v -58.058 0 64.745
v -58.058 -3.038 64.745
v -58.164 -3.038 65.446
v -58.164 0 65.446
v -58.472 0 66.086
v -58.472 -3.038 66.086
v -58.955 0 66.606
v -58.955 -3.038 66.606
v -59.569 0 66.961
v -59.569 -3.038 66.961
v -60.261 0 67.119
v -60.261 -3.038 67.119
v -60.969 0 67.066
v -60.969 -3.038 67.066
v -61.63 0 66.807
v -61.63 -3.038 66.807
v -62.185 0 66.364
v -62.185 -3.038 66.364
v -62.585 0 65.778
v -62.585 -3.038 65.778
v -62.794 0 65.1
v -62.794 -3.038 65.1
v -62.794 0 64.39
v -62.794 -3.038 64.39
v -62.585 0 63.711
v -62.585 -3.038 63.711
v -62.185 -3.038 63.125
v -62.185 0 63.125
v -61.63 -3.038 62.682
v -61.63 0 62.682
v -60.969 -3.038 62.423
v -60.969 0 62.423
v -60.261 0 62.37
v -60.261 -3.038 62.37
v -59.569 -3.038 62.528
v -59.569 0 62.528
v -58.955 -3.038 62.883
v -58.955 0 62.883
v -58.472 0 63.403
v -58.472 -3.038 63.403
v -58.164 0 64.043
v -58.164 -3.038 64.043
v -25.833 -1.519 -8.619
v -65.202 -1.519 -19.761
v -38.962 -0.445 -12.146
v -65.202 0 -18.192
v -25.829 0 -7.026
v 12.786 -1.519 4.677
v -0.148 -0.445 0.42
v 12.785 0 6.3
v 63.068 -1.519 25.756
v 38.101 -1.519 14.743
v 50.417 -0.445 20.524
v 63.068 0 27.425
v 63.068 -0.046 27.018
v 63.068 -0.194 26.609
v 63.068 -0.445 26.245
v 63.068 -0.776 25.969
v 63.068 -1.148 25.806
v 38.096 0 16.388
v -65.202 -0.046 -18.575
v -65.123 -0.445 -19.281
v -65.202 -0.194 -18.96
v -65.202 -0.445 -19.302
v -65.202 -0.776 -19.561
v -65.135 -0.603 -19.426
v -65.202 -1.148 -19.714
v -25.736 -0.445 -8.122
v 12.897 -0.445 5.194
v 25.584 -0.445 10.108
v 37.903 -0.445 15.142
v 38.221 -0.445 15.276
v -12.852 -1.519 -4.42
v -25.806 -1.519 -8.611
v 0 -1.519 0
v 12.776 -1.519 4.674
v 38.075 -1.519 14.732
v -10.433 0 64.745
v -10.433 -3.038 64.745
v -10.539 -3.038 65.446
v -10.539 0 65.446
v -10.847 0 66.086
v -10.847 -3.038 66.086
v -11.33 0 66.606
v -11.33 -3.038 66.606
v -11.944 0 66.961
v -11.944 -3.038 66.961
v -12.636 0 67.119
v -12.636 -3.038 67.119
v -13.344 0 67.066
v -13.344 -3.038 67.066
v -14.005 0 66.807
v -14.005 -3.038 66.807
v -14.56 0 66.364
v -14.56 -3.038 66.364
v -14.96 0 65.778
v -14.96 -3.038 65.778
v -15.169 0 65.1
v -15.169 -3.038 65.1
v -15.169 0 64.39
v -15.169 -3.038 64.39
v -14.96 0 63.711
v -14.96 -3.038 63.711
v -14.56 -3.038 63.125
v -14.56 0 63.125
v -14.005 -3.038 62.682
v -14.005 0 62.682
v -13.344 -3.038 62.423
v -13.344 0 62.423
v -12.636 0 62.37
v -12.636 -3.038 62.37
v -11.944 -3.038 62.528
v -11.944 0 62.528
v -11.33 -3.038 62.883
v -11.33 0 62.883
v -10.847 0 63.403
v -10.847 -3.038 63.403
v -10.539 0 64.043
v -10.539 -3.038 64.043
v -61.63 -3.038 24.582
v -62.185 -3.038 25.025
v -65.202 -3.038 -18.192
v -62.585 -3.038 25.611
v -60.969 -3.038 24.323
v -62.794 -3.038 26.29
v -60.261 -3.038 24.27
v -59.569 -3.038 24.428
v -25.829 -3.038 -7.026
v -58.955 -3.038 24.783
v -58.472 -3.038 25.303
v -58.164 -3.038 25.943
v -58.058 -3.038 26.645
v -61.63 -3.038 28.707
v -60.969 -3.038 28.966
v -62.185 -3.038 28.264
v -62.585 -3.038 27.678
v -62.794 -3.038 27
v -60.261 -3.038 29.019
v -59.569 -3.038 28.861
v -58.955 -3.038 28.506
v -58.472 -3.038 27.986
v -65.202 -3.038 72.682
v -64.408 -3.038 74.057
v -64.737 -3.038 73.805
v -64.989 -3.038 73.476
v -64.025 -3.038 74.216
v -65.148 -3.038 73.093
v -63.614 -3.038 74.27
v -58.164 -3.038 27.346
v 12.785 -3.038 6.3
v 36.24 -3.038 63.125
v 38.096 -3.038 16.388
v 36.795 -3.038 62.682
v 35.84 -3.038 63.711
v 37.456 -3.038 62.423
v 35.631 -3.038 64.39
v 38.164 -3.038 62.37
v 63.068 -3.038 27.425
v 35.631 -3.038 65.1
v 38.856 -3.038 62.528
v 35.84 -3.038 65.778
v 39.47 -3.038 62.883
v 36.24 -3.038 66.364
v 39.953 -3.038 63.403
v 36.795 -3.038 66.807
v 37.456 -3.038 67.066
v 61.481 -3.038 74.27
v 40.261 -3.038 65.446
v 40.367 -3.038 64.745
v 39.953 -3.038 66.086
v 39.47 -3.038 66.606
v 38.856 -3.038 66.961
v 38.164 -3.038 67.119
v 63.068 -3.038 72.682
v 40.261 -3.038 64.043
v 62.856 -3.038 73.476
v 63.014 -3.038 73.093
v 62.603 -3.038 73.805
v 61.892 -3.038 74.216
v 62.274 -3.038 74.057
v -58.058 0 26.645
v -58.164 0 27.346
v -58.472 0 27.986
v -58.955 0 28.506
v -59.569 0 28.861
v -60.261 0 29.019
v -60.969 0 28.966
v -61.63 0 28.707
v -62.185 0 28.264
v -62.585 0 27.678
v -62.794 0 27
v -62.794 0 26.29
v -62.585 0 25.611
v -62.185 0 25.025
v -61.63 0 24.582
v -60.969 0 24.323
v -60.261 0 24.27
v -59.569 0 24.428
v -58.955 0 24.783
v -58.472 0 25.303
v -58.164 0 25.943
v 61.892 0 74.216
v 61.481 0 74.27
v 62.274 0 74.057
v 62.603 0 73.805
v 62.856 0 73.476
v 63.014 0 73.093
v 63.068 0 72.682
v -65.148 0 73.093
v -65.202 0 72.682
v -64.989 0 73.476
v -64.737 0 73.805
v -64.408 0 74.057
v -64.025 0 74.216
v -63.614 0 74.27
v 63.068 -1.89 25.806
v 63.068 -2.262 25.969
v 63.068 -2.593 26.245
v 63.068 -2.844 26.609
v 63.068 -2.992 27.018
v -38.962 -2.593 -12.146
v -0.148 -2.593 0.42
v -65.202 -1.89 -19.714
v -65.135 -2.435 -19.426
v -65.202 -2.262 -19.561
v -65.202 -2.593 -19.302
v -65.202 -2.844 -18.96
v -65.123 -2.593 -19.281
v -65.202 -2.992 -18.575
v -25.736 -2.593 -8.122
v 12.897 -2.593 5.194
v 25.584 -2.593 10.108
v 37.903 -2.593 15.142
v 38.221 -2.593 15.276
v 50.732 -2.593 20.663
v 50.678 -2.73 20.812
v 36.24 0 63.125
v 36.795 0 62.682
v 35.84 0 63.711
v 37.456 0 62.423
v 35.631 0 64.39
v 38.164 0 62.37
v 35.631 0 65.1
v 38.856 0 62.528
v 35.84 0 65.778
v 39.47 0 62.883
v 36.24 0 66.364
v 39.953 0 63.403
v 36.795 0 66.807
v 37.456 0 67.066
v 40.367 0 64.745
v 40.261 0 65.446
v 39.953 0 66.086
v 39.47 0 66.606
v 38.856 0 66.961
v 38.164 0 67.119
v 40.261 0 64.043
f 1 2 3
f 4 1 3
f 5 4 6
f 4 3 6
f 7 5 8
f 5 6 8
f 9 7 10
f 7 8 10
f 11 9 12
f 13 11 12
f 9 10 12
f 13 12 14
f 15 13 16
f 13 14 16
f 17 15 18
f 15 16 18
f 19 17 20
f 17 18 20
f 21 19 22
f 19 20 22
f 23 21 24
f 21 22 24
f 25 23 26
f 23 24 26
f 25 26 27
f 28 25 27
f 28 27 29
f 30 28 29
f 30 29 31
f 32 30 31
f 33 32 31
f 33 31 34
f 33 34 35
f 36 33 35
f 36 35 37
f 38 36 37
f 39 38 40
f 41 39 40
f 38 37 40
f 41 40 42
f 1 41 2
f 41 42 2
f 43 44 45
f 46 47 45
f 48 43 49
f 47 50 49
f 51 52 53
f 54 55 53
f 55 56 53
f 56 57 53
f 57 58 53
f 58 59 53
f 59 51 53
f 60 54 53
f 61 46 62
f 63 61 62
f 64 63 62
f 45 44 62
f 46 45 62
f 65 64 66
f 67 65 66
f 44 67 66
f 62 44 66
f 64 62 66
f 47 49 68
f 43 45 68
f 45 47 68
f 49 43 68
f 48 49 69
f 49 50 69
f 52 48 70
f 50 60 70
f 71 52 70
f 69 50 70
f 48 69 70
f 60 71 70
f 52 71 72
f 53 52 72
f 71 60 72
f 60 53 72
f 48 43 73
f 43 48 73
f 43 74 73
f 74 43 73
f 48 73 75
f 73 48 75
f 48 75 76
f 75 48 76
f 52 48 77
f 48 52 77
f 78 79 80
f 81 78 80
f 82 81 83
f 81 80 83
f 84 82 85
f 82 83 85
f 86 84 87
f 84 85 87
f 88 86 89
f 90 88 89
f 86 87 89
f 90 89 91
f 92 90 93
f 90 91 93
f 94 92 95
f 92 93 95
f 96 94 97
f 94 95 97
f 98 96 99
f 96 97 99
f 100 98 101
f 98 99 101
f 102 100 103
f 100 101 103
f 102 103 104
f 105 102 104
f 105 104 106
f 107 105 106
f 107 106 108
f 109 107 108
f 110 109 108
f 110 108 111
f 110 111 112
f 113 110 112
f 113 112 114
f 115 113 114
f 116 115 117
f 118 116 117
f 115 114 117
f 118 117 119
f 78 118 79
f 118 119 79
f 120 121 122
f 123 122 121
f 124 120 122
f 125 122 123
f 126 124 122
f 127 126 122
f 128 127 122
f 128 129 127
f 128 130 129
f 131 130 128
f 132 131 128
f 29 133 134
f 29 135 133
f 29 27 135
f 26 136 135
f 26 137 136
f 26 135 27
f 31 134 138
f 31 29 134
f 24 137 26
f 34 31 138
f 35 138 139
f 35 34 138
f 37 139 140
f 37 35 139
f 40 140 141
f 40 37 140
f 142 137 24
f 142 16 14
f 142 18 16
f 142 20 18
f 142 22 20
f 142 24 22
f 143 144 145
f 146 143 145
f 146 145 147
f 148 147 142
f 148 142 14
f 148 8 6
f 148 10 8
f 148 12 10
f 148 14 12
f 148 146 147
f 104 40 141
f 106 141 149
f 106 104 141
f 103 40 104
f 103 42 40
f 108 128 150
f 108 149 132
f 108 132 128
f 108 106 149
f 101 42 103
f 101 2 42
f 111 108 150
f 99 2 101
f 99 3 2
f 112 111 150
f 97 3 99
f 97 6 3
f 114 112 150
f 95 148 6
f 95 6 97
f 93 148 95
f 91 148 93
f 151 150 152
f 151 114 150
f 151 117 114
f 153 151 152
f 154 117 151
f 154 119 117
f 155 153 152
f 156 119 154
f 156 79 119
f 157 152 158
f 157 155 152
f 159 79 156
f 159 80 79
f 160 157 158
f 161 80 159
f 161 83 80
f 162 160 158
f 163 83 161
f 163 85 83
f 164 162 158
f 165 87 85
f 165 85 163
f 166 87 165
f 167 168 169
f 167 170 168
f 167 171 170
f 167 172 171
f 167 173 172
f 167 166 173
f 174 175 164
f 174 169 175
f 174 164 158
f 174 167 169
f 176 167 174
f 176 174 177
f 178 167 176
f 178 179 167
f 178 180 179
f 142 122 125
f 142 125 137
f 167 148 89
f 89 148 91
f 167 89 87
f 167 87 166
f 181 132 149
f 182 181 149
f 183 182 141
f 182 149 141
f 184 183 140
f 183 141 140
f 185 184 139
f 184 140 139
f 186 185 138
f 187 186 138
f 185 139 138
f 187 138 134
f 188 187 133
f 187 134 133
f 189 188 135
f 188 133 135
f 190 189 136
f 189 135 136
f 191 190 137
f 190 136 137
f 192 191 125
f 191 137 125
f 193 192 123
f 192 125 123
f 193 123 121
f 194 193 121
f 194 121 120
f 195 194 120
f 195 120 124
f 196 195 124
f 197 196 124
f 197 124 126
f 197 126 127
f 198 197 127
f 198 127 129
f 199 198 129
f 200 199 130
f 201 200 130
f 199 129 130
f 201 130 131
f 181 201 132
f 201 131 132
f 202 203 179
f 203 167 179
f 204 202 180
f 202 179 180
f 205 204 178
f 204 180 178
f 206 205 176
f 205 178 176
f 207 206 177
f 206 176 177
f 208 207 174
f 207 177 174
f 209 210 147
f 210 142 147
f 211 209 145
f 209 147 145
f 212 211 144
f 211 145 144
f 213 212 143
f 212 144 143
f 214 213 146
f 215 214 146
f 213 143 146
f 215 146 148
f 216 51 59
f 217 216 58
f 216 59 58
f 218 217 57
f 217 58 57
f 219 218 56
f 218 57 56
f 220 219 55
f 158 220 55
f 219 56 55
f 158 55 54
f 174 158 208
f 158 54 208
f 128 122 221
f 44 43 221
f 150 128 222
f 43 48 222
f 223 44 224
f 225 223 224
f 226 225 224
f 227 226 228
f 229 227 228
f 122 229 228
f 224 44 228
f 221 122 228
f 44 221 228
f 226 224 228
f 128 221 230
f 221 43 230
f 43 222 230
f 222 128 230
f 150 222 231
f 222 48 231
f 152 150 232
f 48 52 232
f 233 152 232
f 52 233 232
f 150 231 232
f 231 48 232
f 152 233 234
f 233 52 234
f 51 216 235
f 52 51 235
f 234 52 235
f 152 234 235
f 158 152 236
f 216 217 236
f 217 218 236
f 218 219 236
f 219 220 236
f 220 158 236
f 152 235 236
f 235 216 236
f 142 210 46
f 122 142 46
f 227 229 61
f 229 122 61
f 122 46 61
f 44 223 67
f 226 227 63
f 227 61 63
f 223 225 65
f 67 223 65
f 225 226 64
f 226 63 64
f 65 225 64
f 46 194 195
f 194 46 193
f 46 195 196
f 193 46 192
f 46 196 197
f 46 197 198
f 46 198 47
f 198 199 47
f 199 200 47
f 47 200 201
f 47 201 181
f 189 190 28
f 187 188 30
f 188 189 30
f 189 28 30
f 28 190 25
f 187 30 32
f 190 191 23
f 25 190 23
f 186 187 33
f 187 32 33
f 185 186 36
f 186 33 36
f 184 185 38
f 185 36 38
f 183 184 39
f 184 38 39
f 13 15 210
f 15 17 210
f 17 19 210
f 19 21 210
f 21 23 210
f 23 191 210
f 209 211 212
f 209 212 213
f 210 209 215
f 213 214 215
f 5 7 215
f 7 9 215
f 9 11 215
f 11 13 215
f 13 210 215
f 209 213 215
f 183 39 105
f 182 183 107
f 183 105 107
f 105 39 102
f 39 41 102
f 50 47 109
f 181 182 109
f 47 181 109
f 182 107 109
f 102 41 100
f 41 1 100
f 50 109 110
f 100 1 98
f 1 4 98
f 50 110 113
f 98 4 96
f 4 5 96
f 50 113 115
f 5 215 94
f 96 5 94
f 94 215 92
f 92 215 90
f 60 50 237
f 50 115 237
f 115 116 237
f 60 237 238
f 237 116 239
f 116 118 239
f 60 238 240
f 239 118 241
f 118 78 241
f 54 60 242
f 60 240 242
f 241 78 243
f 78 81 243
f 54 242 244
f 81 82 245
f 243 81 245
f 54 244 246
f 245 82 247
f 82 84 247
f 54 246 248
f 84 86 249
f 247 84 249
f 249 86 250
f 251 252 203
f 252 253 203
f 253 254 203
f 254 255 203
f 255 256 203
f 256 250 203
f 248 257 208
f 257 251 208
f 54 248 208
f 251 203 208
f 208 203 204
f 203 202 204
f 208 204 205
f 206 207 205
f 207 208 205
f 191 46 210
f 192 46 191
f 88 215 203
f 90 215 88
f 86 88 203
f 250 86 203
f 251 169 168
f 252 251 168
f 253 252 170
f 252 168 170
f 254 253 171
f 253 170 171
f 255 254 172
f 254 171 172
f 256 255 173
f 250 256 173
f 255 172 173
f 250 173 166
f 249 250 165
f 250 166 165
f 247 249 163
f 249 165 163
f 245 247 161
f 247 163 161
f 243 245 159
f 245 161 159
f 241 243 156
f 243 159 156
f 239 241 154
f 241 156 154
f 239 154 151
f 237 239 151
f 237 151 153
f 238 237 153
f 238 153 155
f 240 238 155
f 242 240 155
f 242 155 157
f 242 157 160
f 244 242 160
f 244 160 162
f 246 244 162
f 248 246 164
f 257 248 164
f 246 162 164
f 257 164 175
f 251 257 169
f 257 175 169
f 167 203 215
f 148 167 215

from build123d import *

# Parameters (mm, degrees)
F1_DEPTH = 3.03784
F2_R     = 2.38125
F3_DEPTH = 3.03784
F4_R     = 1.5875
F5_R     = 1.51882


# Not quite as in the source:
# - a fillet or chamfer is up to 0.001 mm smaller than in the source, because OpenCascade refuses the exact size


with BuildPart() as f1:
    # F0 (on Front) → F1 (new body)
    with BuildSketch(Plane.XZ):
        with BuildLine():
            Line((-65.2018, 74.2696), (-65.2018, -19.7612))
            add(Edge.make_bspline(
                [(-65.2018, -19.7612), (-60.7850037253, -18.6171418479), (-51.9575306305, -16.3306106319), (-38.8253253798, -12.61749568), (-25.7966517502, -8.6478861048), (-12.8391741047, -4.4585465011), (0.0137529583, -0.0438991729), (12.7925184797, 4.6371253852), (25.4667360287, 9.5345524455), (38.0928063194, 14.6983578431), (50.6196821862, 20.0682362577), (58.915858645, 23.8585166667), (63.0682, 25.7556)],
                knots=[0, 0, 0, 0, 0.1001945647, 0.2002503103, 0.3002105802, 0.4001552007, 0.5000116128, 0.5999162071, 0.6997672128, 0.7997893994, 0.8997920596, 1, 1, 1, 1], degree=3))
            Line((63.0682, 25.7556), (63.0682, 74.2696))
            Line((63.0682, 74.2696), (-65.2018, 74.2696))
        make_face()
    extrude(amount=F1_DEPTH)

    # F2 (on face) → F3 (cut, through all)
    with BuildSketch(Plane.XZ.offset(3.03784)):
        with Locations((-60.4393, 64.7446)):
            Circle(F2_R)
        with Locations((-60.4393, 26.6446)):
            Circle(F2_R)
        with Locations((-12.8143, 64.7446)):
            Circle(F2_R)
        with Locations((37.9857, 64.7446)):
            Circle(F2_R)
    extrude(amount=-F3_DEPTH, mode=Mode.SUBTRACT)

    # F4
    f4_edges = [f1.edges().sort_by_distance(p)[0] for p in [
        (-65.2018, -1.51892, 74.2696),
        (63.0682, -1.51892, 74.2696),
    ]]
    fillet(f4_edges, radius=F4_R)

    # F5 (radius 1.51892 in the source; OpenCascade refuses exactly that, so slightly less here)
    f5_edges = [f1.edges().sort_by_distance(p)[0] for p in [
        (-0.002981, -3.03784, -0.001058),
        (-0.002981, 0, -0.001058),
    ]]
    fillet(f5_edges, radius=F5_R)


solid = f1.part
